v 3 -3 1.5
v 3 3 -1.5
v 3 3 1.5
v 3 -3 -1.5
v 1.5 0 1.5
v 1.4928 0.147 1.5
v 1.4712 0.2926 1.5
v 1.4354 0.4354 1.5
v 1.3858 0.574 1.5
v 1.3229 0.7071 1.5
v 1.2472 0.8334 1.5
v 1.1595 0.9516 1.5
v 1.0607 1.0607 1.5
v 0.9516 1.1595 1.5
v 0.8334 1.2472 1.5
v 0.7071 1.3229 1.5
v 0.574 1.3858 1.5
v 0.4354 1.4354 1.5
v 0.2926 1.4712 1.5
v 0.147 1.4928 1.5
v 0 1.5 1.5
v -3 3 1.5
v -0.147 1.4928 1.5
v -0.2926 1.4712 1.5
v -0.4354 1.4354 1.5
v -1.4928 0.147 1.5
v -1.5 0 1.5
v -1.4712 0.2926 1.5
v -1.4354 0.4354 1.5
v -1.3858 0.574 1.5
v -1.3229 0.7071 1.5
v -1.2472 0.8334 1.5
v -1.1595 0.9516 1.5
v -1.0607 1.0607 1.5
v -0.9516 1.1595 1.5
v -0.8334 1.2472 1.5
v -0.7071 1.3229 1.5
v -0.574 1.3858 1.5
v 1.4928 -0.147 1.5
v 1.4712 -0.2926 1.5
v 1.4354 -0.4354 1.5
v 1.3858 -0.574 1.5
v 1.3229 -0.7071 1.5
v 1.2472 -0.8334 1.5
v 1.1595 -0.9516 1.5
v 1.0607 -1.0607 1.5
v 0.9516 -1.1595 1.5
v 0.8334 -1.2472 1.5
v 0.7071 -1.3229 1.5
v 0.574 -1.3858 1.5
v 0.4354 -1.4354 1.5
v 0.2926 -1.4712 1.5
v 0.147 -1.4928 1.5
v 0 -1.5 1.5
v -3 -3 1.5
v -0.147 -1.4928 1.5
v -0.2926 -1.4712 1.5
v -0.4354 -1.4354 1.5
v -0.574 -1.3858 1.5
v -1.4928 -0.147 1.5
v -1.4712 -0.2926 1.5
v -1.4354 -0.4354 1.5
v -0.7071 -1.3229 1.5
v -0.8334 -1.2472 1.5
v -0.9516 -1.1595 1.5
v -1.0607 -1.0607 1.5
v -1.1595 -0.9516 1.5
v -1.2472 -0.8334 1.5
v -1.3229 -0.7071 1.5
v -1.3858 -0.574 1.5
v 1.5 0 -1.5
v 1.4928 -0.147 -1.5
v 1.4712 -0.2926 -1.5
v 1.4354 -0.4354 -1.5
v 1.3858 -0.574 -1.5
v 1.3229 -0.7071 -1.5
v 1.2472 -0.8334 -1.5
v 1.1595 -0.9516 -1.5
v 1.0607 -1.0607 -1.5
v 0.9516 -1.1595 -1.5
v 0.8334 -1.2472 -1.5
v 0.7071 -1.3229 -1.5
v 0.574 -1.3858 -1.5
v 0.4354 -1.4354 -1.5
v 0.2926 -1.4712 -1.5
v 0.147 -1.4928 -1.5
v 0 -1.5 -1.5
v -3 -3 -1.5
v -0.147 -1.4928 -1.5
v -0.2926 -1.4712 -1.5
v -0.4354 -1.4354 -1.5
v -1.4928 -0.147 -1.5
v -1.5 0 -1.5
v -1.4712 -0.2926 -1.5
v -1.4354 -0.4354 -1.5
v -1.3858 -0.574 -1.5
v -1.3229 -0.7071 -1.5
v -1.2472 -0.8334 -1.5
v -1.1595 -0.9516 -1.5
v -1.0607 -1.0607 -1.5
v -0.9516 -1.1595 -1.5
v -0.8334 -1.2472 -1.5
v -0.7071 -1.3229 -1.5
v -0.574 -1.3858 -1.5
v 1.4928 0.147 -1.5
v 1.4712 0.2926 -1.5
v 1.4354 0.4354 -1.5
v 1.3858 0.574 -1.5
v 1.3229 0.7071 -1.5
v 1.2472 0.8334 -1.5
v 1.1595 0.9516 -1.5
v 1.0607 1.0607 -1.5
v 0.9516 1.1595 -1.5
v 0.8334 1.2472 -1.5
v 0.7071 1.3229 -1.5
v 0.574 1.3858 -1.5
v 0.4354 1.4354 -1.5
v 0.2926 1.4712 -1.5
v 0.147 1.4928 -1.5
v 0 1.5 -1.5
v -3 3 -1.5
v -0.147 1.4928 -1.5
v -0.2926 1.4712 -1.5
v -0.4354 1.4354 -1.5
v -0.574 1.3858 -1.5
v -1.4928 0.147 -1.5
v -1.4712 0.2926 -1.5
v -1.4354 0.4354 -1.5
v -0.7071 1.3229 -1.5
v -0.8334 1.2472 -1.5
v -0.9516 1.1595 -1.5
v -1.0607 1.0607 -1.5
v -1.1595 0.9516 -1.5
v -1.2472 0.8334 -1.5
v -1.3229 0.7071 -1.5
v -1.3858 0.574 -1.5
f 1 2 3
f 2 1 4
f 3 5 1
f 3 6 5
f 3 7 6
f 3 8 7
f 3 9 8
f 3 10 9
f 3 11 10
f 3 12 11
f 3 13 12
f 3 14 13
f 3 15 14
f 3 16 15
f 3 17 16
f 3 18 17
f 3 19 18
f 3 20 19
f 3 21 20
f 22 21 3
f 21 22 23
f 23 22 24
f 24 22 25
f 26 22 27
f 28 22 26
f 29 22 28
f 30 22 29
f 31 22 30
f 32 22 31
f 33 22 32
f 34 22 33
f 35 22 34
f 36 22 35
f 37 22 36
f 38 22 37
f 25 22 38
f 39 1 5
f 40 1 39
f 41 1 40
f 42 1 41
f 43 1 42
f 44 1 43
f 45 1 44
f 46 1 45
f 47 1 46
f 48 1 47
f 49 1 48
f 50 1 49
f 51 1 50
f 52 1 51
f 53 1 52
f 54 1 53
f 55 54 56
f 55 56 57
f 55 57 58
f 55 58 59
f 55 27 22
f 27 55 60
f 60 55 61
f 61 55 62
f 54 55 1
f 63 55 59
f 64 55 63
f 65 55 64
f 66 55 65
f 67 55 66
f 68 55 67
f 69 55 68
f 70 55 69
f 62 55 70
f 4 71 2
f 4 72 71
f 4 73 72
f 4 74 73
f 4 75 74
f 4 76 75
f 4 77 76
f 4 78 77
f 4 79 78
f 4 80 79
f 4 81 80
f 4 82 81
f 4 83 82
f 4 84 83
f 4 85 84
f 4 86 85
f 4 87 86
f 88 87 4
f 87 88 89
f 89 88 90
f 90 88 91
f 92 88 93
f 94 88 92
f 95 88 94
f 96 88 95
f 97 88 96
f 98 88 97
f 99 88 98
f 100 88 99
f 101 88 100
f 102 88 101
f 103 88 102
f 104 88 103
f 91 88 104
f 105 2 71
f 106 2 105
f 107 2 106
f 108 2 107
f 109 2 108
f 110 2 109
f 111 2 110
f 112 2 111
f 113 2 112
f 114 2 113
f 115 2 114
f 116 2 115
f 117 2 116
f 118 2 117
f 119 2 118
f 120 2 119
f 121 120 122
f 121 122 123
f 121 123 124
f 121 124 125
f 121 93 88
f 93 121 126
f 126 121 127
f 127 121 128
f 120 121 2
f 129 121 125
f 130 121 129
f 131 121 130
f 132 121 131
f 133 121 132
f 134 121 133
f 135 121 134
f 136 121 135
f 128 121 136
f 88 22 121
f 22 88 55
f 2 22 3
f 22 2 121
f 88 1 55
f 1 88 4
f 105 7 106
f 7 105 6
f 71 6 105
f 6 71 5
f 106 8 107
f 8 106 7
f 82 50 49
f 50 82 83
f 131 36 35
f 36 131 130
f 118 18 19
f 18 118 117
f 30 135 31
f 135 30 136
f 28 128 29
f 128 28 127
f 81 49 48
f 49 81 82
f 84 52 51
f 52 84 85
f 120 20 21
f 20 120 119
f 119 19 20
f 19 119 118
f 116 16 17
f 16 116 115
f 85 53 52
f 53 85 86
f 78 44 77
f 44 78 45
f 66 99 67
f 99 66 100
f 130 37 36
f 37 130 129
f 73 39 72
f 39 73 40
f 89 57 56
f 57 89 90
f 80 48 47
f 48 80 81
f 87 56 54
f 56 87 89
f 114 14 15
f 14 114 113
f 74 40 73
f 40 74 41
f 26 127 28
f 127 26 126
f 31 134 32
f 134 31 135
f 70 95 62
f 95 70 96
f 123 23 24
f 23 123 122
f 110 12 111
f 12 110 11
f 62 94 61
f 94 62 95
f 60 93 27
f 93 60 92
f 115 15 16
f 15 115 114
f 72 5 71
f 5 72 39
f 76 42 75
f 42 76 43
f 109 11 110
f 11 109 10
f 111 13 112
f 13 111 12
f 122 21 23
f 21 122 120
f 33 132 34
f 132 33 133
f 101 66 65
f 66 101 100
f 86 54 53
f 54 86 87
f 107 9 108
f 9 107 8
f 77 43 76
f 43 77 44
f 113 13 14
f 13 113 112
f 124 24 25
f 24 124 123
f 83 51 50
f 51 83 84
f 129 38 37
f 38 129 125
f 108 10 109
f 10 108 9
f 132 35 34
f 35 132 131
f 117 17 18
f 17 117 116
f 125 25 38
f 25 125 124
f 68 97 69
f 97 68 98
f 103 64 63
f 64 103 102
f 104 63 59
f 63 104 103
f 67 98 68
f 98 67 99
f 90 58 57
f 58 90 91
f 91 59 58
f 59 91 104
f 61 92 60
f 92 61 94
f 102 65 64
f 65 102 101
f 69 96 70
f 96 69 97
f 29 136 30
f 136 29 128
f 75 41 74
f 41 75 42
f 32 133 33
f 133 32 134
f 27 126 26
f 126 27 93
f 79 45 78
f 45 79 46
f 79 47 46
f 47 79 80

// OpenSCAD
module t_slot_nut() {
    difference() {
        // Main body of the T-slot nut
        cube([6, 6, 3], center = true);
        
        // Hole for the screw
        translate([0, 0, -1.5])
            cylinder(h = 5, r = 1.5, $fn = 64);
    }
}

t_slot_nut();
